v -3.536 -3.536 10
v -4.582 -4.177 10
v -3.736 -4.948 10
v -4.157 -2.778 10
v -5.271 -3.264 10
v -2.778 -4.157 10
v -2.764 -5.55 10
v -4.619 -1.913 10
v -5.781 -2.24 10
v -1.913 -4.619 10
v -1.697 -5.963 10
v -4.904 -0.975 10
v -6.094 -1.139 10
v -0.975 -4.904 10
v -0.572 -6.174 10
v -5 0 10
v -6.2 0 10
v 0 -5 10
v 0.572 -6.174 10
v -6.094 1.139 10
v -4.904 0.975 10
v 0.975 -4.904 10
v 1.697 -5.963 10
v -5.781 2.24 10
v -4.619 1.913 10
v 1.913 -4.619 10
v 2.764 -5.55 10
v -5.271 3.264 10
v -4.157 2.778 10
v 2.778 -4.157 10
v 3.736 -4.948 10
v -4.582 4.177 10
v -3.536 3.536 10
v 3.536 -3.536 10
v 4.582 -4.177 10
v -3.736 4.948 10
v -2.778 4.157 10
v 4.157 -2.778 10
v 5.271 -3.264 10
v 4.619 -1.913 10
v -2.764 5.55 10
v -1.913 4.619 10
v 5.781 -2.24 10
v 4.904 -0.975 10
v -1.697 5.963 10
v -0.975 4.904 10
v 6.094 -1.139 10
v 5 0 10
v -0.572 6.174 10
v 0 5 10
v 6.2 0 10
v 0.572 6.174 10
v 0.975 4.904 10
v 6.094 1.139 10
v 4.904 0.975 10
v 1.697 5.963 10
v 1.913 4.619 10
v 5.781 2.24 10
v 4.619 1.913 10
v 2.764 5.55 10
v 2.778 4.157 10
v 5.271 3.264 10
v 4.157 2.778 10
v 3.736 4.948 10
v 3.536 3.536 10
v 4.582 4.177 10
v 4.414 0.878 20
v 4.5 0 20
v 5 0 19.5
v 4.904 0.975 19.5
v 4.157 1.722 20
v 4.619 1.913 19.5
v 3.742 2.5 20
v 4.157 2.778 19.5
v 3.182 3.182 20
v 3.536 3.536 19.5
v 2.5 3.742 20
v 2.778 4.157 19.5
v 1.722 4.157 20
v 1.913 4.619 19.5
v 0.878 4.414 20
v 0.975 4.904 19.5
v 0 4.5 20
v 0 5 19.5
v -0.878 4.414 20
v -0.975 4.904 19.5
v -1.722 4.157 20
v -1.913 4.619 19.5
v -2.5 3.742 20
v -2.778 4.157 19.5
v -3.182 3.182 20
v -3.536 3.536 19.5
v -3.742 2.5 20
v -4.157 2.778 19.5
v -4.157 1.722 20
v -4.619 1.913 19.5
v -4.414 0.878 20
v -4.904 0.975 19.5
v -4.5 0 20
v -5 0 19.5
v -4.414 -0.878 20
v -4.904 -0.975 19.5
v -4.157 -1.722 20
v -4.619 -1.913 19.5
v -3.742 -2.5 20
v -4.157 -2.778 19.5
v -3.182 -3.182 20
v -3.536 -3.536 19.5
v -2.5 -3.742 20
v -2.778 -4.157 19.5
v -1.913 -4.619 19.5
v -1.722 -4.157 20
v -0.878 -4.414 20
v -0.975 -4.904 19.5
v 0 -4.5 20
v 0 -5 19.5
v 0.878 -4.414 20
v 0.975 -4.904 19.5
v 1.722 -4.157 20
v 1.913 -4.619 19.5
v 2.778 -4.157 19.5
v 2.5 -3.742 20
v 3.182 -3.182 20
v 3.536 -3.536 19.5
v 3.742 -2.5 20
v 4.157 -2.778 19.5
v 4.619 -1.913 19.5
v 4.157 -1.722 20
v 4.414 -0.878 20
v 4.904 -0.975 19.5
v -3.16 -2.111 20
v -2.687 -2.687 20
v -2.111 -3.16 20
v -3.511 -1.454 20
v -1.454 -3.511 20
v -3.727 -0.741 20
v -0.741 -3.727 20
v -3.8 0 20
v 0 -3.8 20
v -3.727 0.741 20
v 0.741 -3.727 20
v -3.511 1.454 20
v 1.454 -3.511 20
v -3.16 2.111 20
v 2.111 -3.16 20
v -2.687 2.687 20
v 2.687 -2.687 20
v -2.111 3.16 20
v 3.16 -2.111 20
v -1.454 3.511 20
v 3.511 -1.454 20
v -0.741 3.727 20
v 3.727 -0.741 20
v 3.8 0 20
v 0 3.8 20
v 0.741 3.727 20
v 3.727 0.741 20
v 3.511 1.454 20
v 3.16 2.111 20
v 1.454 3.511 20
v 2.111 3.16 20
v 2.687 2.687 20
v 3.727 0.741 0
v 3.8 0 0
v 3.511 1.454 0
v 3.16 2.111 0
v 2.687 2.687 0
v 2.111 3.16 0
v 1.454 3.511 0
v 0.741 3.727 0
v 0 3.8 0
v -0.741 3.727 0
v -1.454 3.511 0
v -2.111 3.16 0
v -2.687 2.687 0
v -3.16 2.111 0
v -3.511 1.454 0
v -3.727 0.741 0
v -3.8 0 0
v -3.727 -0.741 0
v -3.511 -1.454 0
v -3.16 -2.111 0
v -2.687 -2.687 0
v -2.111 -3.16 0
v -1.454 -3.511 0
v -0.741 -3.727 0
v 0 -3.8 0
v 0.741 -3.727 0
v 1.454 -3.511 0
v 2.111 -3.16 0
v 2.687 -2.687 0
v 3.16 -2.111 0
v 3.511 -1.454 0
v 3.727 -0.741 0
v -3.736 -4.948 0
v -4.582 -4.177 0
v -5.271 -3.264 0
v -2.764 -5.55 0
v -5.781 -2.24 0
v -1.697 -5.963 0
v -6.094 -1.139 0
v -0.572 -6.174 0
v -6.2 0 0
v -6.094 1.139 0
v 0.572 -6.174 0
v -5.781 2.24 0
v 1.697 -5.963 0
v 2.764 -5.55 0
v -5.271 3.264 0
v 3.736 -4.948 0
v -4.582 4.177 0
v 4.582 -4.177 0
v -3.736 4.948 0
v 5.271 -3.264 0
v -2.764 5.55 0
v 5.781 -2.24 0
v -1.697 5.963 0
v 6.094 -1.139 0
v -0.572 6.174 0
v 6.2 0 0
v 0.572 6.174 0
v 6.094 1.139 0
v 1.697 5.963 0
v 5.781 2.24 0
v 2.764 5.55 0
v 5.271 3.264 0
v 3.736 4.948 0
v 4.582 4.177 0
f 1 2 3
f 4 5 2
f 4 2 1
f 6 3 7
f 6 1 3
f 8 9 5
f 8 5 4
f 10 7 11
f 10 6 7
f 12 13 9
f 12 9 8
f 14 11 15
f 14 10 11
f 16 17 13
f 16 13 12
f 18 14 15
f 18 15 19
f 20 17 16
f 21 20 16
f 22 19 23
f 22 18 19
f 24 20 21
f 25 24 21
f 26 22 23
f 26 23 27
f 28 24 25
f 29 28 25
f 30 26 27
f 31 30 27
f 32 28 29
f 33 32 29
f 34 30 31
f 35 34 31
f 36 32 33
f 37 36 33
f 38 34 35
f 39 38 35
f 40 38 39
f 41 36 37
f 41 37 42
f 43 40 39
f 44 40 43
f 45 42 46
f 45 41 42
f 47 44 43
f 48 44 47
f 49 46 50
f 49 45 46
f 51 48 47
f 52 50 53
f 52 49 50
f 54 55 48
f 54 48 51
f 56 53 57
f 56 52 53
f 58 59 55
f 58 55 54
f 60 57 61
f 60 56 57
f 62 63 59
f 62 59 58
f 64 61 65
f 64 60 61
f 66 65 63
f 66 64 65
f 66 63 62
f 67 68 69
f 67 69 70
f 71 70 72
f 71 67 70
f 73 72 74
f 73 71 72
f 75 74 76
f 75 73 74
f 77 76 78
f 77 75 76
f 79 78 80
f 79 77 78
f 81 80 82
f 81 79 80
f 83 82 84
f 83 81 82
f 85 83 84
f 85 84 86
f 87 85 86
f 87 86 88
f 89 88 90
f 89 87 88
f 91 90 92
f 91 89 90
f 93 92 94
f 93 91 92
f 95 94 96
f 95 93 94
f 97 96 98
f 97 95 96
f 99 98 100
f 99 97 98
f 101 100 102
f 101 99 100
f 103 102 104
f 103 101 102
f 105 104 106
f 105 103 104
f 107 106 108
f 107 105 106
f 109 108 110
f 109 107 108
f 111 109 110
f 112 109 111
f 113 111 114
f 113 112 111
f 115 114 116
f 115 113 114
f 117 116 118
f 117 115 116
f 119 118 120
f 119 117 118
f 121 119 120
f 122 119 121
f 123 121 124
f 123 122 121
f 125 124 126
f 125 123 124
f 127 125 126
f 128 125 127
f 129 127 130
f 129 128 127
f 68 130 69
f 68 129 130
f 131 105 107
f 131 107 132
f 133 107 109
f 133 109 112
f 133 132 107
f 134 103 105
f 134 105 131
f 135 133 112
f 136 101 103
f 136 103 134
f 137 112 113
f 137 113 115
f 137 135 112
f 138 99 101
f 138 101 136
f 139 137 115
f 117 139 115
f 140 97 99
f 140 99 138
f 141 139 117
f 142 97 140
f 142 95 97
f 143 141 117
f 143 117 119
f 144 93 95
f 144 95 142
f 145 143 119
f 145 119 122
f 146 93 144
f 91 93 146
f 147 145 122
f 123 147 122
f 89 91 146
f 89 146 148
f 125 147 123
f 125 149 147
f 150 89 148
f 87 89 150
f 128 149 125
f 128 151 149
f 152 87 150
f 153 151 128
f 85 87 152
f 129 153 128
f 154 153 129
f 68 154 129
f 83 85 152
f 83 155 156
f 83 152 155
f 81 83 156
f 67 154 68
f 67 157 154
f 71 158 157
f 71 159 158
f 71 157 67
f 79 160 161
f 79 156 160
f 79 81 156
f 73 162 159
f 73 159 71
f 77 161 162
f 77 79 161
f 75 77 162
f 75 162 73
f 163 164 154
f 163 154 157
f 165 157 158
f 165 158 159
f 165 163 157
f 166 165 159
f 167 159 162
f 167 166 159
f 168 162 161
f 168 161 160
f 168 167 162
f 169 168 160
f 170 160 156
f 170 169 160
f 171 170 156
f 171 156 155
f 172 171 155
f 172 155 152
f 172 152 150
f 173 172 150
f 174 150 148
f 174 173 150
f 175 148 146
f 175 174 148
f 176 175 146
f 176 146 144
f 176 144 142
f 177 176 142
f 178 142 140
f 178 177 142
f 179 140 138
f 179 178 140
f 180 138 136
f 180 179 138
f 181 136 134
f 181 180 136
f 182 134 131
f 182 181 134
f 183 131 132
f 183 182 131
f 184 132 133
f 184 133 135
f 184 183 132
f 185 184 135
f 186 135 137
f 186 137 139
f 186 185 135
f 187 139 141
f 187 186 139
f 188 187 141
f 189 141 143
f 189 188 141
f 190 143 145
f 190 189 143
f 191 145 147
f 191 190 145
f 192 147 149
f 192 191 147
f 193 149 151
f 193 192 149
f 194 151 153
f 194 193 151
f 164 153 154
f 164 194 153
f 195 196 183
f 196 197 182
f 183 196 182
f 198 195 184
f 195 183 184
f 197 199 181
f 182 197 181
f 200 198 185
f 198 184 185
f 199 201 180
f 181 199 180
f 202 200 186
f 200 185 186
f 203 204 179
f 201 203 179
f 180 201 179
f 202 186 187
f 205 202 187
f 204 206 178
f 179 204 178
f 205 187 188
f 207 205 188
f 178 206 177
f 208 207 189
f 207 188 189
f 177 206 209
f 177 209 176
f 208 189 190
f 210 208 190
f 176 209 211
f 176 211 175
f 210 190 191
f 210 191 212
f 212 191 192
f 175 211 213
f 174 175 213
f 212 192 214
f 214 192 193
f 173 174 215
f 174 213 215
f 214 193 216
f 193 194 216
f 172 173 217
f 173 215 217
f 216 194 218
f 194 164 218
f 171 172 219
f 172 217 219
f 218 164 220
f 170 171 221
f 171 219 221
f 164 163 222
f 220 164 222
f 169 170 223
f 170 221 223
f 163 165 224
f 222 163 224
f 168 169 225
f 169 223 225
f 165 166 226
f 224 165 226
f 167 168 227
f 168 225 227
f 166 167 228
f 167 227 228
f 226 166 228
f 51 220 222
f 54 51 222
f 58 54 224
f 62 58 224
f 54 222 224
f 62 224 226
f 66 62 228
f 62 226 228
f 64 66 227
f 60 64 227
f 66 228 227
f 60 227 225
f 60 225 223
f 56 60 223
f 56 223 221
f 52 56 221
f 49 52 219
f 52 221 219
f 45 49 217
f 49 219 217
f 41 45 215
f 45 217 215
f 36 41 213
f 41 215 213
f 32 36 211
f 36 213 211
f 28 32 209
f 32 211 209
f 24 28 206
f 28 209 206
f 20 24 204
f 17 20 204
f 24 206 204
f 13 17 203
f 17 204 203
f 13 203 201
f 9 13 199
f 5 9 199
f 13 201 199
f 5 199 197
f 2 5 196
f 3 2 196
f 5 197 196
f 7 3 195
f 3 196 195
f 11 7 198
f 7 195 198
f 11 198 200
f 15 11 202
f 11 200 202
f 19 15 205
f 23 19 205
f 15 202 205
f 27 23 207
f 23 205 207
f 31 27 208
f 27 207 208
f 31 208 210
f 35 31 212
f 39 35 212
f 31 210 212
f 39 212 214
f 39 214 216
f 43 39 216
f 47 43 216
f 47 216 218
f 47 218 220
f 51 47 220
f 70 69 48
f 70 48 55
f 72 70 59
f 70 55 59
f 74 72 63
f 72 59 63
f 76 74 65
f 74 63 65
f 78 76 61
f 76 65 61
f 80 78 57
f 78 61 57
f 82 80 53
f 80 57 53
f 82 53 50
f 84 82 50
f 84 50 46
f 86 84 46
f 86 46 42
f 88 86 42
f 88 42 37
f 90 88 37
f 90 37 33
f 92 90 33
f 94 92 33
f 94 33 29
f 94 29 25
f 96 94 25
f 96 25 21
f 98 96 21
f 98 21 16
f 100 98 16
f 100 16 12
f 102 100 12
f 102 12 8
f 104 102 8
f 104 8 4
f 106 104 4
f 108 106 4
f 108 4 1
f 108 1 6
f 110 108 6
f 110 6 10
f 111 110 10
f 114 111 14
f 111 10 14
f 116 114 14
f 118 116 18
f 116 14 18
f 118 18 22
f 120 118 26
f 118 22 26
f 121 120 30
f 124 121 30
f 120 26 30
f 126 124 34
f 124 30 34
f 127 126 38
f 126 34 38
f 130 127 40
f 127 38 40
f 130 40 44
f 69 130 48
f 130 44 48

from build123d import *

# Parameters (mm, degrees)
F0_R     = 6.2
F0_R_2   = 5
F1_DEPTH = 10
F0_R_3   = 3.8
F2_DEPTH = 20
F3_SIZE  = 0.5


with BuildPart() as f1:
    # F0 (on Top) → F1 (new body)
    with BuildSketch(Plane.XY):
        Circle(F0_R)
        Circle(F0_R_2, mode=Mode.SUBTRACT)
    extrude(amount=F1_DEPTH)

    # F0 (on Top) → F2 (join)
    with BuildSketch(Plane.XY):
        Circle(F0_R_2)
        Circle(F0_R_3, mode=Mode.SUBTRACT)
    extrude(amount=F2_DEPTH)

    # F3
    f3_edges = [f1.edges().sort_by_distance(p)[0] for p in [
        (-5, 0, 20),
    ]]
    chamfer(f3_edges, length=F3_SIZE)


solid = f1.part
